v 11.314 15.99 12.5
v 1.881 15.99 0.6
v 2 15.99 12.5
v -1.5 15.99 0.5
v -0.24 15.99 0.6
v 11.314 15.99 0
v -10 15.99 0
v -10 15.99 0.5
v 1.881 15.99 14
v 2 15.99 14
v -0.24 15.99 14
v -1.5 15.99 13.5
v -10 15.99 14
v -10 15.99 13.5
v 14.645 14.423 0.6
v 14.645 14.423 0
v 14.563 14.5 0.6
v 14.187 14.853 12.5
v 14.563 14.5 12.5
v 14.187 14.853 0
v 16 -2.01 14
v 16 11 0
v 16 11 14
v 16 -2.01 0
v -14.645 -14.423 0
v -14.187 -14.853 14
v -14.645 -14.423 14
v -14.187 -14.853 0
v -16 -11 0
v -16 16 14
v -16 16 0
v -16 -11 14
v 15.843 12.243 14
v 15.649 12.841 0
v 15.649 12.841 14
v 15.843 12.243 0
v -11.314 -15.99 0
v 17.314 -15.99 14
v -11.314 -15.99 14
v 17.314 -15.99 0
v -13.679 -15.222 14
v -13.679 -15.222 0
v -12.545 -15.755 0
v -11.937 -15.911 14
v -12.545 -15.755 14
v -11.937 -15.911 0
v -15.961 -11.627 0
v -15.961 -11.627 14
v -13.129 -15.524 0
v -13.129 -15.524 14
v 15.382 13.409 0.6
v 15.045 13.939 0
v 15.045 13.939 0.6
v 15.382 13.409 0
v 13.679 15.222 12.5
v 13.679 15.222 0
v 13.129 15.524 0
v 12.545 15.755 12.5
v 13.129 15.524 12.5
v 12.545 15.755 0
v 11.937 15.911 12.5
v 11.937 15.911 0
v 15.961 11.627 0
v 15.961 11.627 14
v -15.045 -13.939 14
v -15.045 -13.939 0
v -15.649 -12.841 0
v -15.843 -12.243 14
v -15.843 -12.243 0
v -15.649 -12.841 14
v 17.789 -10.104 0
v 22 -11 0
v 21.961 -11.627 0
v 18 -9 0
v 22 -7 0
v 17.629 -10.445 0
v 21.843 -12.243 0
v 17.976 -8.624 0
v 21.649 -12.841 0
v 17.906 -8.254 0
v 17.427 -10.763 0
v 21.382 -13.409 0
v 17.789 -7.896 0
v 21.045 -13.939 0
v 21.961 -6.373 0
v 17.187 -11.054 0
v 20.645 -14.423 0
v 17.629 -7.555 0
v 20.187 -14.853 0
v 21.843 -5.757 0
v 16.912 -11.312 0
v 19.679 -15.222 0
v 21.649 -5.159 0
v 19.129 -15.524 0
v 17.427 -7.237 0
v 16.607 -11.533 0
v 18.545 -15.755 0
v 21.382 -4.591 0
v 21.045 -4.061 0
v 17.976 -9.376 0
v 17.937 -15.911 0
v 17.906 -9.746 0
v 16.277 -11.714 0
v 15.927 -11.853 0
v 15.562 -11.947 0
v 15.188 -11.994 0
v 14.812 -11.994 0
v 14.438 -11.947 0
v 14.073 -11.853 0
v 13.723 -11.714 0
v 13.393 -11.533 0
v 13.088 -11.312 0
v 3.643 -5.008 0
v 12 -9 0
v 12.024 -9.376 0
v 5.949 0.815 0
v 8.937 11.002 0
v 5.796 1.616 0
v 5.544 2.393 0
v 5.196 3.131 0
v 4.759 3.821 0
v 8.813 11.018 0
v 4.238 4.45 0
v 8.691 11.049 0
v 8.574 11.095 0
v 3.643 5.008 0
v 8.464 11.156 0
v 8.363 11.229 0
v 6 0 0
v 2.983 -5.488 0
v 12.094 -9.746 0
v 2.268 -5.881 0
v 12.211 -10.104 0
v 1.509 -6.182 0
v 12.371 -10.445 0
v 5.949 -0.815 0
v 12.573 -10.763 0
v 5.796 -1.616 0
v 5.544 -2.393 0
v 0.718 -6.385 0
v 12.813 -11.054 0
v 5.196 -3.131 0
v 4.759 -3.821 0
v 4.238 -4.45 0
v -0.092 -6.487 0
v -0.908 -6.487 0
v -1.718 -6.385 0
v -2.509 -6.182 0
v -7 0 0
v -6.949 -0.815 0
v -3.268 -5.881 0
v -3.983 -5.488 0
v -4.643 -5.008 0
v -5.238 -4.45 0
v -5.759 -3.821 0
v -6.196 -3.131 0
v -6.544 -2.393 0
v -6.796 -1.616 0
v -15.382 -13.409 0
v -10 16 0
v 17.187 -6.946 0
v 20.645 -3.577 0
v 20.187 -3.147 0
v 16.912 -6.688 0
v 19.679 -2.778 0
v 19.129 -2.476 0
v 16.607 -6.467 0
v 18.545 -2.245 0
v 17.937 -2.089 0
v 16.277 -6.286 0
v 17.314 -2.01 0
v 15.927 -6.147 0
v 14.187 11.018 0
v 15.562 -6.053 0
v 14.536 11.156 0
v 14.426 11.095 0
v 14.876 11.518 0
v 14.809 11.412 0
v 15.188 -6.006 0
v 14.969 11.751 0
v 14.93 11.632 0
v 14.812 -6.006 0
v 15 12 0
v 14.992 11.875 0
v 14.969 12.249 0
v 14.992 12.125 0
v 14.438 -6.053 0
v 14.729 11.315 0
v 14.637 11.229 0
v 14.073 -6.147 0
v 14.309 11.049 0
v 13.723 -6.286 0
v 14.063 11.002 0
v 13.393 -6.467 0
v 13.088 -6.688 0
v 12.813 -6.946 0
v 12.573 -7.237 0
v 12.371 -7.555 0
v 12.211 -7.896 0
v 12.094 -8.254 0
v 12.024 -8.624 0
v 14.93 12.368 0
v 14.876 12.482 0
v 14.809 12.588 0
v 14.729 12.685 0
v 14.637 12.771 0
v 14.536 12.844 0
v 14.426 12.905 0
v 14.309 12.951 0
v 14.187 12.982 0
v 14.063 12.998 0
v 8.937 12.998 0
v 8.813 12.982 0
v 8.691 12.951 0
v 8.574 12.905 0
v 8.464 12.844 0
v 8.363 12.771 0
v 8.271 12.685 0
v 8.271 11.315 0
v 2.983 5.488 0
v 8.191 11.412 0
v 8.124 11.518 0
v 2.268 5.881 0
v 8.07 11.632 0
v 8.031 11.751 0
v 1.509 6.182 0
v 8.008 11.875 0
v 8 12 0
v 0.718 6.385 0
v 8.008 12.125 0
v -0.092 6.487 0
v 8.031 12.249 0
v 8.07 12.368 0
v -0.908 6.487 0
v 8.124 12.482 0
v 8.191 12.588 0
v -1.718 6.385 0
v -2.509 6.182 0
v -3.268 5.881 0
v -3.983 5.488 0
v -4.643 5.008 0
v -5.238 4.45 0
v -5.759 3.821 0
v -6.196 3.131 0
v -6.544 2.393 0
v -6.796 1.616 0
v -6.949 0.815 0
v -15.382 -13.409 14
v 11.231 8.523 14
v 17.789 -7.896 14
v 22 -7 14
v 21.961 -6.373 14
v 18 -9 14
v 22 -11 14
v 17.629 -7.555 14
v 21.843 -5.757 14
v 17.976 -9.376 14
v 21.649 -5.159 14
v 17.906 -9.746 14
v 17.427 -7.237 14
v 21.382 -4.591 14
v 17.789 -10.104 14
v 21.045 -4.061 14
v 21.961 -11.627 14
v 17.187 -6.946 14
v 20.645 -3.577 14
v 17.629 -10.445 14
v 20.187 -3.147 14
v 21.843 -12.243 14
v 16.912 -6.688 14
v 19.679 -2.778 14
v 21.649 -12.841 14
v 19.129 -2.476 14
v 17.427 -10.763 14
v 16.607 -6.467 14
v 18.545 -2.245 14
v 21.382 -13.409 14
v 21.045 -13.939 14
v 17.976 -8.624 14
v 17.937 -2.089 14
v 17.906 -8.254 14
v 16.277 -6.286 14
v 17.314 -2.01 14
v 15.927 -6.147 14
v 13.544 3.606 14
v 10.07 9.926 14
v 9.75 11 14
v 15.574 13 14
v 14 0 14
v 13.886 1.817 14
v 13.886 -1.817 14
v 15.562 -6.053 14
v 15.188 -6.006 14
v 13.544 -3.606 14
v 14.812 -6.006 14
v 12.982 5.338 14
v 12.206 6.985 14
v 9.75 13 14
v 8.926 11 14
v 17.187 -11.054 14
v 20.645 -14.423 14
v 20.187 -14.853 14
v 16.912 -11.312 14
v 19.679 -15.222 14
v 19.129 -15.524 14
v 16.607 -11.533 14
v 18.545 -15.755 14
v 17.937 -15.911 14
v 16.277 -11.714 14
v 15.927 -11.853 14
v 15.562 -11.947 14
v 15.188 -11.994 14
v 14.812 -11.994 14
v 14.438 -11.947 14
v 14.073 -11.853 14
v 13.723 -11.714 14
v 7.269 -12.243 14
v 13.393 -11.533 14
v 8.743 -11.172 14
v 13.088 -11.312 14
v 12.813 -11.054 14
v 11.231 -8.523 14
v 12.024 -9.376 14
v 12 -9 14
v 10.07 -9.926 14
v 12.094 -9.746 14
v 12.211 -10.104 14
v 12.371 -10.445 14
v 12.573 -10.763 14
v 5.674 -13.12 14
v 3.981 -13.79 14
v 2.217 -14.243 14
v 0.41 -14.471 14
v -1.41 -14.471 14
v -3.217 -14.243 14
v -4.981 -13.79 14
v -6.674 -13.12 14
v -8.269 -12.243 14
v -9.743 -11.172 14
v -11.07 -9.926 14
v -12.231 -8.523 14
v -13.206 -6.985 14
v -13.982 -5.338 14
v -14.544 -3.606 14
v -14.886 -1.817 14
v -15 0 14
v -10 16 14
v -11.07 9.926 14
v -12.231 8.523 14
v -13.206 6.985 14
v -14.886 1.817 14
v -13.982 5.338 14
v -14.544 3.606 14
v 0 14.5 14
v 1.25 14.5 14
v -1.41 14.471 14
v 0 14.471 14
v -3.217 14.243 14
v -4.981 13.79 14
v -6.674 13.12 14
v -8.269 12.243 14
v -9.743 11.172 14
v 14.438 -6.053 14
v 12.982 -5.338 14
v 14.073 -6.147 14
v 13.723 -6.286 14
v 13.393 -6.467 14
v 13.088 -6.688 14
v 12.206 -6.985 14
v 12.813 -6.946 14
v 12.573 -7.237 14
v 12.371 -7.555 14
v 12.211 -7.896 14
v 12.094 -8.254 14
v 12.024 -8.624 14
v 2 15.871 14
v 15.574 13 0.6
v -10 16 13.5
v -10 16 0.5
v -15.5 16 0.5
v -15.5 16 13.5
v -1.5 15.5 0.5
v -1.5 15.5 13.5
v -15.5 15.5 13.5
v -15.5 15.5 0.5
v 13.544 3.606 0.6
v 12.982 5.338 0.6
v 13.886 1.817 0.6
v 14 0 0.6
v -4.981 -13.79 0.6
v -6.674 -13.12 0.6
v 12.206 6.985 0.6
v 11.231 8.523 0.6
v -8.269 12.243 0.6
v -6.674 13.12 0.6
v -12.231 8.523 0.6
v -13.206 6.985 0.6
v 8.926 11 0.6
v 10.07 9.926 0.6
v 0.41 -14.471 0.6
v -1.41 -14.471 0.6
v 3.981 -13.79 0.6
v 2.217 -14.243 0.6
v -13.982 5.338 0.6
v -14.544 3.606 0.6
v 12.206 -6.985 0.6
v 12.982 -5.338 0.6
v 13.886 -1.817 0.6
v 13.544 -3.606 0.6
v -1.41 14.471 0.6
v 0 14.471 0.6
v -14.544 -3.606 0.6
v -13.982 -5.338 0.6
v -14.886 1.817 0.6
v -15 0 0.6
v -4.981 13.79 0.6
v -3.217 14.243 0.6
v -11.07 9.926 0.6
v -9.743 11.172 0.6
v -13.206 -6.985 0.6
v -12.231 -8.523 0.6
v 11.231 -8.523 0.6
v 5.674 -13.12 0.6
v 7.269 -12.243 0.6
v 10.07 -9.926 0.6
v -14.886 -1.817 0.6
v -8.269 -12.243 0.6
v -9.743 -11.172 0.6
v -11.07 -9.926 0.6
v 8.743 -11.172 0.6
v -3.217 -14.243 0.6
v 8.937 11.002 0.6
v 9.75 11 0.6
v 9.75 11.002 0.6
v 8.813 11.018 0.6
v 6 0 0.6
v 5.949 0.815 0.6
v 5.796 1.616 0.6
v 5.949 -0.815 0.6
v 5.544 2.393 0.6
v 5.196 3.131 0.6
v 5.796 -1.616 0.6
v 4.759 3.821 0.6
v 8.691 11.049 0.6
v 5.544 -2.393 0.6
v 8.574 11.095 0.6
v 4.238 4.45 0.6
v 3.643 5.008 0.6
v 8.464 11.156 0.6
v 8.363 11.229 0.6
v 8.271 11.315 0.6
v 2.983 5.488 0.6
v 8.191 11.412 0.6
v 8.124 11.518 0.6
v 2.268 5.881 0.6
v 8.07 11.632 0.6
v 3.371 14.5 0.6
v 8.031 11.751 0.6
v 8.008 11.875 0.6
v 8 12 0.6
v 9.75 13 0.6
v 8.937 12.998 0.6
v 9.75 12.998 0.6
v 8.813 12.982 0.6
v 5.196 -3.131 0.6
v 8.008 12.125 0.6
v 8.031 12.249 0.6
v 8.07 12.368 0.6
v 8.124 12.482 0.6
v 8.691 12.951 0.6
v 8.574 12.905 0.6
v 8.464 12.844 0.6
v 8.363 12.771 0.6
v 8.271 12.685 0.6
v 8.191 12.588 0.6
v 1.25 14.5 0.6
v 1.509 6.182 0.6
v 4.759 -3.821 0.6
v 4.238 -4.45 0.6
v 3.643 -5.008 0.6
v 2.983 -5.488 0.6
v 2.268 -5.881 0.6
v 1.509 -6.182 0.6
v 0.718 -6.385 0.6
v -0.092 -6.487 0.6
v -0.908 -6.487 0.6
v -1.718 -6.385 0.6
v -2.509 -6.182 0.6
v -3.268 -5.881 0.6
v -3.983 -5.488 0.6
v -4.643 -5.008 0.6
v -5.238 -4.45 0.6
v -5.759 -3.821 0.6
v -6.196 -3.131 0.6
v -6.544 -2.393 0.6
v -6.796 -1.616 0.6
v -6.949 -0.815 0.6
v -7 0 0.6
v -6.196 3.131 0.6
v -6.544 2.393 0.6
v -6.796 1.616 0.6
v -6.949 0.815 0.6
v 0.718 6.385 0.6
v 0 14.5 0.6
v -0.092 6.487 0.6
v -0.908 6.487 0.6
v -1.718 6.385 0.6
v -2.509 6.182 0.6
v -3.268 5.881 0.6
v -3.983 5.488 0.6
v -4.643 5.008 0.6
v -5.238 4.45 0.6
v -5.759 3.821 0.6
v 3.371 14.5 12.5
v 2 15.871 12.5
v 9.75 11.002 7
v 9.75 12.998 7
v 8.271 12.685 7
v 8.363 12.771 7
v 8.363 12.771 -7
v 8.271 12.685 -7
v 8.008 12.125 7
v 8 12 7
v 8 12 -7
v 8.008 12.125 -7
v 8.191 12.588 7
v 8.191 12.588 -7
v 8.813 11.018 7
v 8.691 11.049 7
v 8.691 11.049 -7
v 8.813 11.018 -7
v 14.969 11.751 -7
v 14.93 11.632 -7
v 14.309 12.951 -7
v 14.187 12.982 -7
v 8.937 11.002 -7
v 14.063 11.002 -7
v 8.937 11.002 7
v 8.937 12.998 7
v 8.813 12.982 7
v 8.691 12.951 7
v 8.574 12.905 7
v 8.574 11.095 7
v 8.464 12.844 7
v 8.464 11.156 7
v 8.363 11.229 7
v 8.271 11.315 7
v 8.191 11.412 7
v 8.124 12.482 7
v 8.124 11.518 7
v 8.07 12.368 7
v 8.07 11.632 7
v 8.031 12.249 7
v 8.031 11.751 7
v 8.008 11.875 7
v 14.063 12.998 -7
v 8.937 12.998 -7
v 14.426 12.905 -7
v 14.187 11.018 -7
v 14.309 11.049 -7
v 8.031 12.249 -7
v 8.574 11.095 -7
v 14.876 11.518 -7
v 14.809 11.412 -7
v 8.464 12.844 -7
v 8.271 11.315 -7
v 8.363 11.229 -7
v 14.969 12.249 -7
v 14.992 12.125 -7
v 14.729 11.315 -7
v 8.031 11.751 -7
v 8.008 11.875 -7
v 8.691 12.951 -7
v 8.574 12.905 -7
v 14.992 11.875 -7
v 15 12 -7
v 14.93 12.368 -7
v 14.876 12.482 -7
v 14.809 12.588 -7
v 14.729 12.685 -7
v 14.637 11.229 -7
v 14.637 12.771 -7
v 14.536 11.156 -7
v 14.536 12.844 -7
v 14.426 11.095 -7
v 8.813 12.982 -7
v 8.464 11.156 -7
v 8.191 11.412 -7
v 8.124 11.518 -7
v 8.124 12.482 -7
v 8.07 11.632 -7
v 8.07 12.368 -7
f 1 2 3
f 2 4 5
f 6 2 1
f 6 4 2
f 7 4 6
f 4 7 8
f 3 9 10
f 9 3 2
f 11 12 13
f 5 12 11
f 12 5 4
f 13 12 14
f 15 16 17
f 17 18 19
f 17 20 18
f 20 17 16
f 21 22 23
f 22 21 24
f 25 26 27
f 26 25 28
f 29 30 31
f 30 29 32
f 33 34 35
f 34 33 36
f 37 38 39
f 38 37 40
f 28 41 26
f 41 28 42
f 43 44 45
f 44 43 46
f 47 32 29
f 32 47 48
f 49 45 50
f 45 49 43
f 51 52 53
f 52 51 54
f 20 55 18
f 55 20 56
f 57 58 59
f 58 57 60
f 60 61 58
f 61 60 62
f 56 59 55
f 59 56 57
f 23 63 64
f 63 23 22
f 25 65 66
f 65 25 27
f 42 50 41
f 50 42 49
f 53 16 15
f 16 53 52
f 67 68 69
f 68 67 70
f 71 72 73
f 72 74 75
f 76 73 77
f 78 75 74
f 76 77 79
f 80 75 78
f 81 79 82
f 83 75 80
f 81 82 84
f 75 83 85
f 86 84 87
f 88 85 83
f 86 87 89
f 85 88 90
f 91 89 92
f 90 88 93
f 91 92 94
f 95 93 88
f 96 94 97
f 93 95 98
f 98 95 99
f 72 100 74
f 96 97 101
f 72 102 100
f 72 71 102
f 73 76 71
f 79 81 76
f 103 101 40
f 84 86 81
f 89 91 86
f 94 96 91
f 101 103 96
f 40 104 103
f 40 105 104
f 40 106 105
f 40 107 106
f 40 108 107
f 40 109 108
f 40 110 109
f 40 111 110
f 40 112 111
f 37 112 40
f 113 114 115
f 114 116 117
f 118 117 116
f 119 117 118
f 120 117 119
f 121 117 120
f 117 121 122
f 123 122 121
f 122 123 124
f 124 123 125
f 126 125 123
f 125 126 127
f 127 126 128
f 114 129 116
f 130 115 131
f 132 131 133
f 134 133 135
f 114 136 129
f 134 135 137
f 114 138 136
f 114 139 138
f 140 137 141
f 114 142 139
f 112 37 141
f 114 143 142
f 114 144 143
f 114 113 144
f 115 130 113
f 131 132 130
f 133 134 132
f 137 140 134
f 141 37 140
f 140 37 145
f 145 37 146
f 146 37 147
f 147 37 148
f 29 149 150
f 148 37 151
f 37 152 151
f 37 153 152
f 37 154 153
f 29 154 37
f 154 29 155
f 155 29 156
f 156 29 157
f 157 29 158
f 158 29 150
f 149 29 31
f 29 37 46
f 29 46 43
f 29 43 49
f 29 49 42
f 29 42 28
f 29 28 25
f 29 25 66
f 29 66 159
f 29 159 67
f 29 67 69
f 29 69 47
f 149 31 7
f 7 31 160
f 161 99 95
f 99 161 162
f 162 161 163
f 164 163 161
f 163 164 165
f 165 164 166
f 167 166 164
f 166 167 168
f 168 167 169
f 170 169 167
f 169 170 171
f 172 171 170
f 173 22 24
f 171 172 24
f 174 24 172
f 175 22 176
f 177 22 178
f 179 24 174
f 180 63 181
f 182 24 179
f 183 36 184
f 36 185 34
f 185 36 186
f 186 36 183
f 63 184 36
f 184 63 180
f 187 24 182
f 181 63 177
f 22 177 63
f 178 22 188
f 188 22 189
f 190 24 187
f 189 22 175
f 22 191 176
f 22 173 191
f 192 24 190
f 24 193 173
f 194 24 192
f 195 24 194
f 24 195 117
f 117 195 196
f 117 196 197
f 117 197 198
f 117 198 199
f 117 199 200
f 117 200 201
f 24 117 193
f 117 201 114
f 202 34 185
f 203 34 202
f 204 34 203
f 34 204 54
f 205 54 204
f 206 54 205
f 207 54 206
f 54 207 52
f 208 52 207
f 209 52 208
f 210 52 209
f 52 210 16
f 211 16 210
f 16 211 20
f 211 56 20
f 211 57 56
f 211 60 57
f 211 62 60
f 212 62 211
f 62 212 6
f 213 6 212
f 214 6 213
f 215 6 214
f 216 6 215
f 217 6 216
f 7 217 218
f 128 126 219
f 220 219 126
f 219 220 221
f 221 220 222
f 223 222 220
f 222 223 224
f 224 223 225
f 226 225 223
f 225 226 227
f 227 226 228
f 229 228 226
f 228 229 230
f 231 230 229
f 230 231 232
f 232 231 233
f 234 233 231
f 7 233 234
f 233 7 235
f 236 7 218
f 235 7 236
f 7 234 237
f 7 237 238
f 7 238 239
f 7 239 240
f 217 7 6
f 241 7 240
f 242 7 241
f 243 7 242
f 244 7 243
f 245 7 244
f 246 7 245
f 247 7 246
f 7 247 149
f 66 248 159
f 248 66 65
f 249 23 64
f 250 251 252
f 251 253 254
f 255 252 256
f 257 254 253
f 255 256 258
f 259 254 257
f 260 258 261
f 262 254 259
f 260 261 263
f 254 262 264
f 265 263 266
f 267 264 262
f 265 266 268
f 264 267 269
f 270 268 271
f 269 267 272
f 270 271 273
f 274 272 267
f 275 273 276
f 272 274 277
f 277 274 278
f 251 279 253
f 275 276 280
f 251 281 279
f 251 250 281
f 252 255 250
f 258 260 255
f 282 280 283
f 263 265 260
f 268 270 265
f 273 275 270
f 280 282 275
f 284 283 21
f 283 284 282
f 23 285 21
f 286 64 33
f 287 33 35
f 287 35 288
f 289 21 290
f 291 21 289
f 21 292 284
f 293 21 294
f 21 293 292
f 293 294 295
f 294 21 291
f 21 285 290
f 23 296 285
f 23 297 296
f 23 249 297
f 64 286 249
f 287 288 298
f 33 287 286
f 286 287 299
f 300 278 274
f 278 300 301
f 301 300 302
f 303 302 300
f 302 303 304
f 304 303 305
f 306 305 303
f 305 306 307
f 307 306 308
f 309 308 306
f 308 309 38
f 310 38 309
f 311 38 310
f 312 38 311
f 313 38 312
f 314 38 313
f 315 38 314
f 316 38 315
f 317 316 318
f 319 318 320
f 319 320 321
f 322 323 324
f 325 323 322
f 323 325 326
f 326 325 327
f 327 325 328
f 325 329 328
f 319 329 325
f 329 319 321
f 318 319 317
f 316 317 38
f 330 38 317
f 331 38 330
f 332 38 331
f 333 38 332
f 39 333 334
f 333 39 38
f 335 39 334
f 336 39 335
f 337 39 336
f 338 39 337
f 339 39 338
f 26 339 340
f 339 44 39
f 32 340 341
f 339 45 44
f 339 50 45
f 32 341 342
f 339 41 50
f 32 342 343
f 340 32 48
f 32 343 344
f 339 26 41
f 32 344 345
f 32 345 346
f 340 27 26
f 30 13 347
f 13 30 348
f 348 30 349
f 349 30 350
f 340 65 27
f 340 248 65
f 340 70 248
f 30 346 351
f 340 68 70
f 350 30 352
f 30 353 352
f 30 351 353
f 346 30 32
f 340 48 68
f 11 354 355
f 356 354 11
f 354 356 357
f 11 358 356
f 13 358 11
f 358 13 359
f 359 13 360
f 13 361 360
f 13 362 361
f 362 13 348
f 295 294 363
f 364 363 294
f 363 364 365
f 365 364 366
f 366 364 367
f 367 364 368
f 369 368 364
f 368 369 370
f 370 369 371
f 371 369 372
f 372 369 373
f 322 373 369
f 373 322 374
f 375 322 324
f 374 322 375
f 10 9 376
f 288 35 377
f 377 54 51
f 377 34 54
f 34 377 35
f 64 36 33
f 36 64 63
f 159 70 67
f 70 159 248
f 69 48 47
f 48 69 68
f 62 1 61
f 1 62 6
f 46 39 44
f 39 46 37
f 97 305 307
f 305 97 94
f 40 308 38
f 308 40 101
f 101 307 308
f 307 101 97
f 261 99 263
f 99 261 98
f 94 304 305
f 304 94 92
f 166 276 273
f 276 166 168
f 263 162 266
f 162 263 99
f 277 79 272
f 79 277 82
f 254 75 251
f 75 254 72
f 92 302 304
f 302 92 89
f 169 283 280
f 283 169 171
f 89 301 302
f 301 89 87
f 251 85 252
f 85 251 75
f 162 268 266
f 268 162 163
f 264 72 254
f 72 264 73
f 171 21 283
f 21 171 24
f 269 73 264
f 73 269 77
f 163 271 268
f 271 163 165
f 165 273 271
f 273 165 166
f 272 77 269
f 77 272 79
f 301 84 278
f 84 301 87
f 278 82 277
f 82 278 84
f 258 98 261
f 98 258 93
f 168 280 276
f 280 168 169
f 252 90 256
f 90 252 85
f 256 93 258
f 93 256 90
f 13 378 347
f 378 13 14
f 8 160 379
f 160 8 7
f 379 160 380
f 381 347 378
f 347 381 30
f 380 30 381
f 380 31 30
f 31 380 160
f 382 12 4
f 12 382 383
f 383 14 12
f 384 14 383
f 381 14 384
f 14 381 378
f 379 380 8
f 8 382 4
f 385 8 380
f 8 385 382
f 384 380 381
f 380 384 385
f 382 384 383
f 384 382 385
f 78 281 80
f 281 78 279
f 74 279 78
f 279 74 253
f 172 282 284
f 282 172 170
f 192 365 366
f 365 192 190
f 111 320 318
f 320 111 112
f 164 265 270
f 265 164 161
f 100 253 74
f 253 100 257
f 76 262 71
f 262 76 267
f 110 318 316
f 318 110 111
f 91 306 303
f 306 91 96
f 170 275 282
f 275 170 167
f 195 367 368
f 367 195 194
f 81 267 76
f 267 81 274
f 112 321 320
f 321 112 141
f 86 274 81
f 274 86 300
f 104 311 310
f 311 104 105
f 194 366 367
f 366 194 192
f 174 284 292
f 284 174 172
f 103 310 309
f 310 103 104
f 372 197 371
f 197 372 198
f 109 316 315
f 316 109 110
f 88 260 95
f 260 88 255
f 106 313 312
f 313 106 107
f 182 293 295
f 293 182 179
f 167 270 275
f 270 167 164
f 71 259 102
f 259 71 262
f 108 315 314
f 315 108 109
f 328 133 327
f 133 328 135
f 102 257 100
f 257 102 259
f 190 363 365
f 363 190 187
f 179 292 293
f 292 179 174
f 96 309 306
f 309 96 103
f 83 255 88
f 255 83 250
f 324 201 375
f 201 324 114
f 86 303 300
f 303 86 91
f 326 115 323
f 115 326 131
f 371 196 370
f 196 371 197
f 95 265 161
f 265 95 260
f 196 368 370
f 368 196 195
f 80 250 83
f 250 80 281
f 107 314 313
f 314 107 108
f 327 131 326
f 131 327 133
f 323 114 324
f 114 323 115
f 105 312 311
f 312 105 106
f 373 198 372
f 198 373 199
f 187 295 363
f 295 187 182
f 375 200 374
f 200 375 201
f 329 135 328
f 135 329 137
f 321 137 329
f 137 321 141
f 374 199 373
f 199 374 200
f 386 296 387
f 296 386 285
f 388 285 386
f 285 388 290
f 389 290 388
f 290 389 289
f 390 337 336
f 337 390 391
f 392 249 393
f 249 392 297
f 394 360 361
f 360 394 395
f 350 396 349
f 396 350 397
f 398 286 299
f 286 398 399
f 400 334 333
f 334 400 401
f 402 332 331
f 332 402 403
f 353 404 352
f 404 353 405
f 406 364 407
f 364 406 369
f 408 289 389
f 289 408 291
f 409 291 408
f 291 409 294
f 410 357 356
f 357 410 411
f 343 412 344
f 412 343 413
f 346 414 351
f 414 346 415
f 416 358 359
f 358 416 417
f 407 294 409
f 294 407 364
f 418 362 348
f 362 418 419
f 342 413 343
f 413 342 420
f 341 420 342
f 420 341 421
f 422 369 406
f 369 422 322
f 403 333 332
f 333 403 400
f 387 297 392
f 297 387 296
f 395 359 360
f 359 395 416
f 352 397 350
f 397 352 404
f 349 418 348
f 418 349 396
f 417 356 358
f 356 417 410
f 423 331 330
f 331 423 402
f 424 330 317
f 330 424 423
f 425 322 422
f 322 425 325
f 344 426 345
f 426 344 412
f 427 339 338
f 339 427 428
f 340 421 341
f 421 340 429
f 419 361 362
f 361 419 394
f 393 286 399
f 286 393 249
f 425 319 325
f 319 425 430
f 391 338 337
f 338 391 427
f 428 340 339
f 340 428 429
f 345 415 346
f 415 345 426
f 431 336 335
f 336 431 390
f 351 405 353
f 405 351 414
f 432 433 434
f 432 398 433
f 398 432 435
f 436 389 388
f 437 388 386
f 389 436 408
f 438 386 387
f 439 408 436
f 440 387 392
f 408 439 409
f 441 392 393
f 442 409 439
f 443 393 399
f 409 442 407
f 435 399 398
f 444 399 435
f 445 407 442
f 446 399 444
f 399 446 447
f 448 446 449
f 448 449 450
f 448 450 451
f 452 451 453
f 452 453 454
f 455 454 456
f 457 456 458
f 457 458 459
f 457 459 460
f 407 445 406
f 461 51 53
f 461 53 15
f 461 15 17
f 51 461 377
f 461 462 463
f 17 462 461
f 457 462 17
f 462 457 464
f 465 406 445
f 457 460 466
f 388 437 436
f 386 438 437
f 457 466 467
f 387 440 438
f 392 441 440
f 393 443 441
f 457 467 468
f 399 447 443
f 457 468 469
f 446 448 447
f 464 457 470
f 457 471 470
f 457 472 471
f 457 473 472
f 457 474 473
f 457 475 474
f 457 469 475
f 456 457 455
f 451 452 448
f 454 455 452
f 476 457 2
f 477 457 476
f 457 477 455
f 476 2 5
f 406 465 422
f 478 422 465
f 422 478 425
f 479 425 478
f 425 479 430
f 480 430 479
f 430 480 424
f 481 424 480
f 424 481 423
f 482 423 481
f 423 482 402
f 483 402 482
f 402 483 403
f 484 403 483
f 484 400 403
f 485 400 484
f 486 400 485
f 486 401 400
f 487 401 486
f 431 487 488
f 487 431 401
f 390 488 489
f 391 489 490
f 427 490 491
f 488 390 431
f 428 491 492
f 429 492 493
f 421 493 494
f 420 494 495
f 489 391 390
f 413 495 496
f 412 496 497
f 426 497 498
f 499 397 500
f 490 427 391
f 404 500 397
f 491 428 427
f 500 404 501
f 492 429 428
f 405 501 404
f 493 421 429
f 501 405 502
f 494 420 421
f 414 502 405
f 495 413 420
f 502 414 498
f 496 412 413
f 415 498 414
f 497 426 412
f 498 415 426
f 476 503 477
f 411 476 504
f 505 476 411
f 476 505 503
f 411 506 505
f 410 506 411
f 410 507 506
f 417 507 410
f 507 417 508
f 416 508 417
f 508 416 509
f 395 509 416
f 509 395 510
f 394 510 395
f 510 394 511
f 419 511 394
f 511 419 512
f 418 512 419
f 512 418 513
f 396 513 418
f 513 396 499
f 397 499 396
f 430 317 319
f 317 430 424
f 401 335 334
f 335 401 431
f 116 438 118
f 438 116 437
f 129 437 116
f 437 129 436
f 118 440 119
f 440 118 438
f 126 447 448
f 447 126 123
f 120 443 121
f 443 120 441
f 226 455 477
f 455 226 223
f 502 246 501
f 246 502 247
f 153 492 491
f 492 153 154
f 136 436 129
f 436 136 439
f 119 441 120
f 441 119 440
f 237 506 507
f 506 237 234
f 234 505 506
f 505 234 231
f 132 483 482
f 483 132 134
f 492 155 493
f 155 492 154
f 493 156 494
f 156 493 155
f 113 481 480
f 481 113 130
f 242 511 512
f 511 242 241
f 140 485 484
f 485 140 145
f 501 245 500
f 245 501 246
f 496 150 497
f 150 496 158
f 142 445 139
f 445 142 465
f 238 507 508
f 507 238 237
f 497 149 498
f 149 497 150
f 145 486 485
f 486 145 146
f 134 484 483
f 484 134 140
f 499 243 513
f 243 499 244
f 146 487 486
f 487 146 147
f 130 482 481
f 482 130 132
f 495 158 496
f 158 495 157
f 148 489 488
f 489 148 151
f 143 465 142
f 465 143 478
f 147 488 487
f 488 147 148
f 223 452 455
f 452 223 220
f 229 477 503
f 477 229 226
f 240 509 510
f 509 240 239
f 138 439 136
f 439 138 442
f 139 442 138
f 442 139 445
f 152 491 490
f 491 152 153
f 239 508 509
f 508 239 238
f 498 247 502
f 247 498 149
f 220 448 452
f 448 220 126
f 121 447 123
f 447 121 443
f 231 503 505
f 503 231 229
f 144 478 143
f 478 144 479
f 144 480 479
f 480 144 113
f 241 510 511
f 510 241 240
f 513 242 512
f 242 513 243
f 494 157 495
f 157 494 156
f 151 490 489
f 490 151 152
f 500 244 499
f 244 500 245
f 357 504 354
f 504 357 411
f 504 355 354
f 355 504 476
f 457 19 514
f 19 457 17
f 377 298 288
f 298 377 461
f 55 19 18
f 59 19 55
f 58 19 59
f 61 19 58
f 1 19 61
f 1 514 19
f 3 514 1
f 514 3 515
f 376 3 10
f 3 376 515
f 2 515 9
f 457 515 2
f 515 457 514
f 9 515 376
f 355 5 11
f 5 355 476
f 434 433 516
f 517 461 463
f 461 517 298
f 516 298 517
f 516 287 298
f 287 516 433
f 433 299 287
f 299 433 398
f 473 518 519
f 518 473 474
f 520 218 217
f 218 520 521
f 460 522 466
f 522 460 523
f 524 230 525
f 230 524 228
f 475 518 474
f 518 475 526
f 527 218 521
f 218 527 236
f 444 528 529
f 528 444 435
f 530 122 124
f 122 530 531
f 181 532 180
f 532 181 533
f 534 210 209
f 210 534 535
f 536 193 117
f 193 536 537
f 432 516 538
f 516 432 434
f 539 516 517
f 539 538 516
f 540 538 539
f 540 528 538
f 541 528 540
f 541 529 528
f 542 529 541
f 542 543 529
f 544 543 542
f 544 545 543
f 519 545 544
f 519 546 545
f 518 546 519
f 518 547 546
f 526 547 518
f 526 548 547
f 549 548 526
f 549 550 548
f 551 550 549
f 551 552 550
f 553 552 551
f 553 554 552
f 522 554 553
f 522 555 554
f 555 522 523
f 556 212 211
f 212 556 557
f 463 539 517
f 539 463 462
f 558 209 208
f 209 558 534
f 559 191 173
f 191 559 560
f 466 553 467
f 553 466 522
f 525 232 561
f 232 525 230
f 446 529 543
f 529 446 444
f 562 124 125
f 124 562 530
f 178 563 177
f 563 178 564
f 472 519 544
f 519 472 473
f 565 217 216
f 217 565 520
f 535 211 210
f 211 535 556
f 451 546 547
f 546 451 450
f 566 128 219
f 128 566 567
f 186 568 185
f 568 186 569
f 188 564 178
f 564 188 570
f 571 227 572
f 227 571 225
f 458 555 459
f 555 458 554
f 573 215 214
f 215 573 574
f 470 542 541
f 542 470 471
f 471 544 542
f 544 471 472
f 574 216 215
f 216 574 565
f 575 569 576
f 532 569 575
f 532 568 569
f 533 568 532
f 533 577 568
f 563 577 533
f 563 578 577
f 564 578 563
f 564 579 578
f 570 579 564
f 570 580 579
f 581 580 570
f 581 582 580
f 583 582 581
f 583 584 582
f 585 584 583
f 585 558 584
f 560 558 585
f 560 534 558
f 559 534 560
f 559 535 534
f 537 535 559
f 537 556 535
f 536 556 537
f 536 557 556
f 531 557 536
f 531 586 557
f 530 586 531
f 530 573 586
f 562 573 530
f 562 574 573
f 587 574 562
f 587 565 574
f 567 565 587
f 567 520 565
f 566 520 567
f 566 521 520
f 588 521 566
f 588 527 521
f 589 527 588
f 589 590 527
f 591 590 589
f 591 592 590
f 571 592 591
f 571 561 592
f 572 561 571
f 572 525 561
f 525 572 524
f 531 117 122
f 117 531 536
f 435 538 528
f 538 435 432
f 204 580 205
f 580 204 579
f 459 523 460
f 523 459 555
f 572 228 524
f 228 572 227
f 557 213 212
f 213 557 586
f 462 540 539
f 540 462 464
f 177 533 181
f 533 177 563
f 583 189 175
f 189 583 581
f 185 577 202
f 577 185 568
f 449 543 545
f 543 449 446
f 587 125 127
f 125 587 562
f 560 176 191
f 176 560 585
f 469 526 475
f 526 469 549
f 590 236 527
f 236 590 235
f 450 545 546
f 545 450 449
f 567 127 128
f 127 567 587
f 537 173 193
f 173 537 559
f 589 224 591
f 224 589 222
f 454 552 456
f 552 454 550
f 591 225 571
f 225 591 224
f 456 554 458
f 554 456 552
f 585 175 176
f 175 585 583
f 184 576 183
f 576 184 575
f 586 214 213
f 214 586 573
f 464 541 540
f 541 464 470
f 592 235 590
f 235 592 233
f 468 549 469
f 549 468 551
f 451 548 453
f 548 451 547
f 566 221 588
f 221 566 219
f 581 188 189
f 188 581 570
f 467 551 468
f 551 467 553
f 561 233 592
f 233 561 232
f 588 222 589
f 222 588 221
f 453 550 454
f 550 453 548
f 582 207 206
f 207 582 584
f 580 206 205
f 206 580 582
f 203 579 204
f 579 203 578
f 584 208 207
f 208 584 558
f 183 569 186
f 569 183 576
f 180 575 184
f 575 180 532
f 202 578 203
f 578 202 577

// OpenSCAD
$fn = 50;


union() {
	difference() {
		union() {
			hull() {
				translate(v = [-11.0000000000, 11.0000000000, 0]) {
					cylinder(h = 14, r = 5);
				}
				translate(v = [11.0000000000, 11.0000000000, 0]) {
					cylinder(h = 14, r = 5);
				}
				translate(v = [-11.0000000000, -11.0000000000, 0]) {
					cylinder(h = 14, r = 5);
				}
				translate(v = [11.0000000000, -11.0000000000, 0]) {
					cylinder(h = 14, r = 5);
				}
			}
			translate(v = [7.5000000000, -9.0000000000, 0]) {
				hull() {
					translate(v = [-9.5000000000, 2.0000000000, 0]) {
						cylinder(h = 14, r = 5);
					}
					translate(v = [9.5000000000, 2.0000000000, 0]) {
						cylinder(h = 14, r = 5);
					}
					translate(v = [-9.5000000000, -2.0000000000, 0]) {
						cylinder(h = 14, r = 5);
					}
					translate(v = [9.5000000000, -2.0000000000, 0]) {
						cylinder(h = 14, r = 5);
					}
				}
			}
			translate(v = [-16.0000000000, 10.0000000000, 0]) {
				cube(size = [6, 6, 14]);
			}
		}
		union() {
			translate(v = [-15.5000000000, 15.5000000000, 0.5000000000]) {
				cube(size = [14, 0.5000000000, 13.0000000000]);
			}
			translate(v = [15.0000000000, -9.0000000000, -100.0000000000]) {
				cylinder(h = 200, r = 3.0000000000);
			}
			translate(v = [-0.5000000000, 0.0000000000, 0.6000000000]) {
				cylinder(h = 16.4000000000, r = 14.5000000000);
			}
			translate(v = [-0.5000000000, 0.0000000000, -7.0000000000]) {
				cylinder(h = 14, r = 6.5000000000);
			}
			translate(v = [0.0000000000, 13.0000000000, 0.6000000000]) {
				cube(size = [16.0000000000, 1.5000000000, 16.4000000000]);
			}
			translate(v = [2.0000000000, 13.0000000000, 12.5000000000]) {
				cube(size = [14.0000000000, 4.5000000000, 1.5000000000]);
			}
			translate(v = [-3.0000000000, 18.7500000000, 0.6000000000]) {
				rotate(a = [0, 0, -45]) {
					cube(size = [10, 1.5000000000, 16.4000000000]);
				}
			}
			translate(v = [2.2500000000, 11.0000000000, 0.6000000000]) {
				cube(size = [7.5000000000, 2, 13.4000000000]);
			}
		}
	}
	union() {
		translate(v = [11.5000000000, 12, -7.0000000000]) {
			rotate(a = [0, 0, 0]) {
				difference() {
					union() {
						hull() {
							translate(v = [2.5000000000, 0, 0]) {
								cylinder(h = 14, r = 1.0000000000, r1 = 1.0000000000, r2 = 1.0000000000);
							}
							translate(v = [-2.5000000000, 0, 0]) {
								cylinder(h = 14, r = 1.0000000000, r1 = 1.0000000000, r2 = 1.0000000000);
							}
						}
					}
					union();
				}
			}
		}
	}
}
